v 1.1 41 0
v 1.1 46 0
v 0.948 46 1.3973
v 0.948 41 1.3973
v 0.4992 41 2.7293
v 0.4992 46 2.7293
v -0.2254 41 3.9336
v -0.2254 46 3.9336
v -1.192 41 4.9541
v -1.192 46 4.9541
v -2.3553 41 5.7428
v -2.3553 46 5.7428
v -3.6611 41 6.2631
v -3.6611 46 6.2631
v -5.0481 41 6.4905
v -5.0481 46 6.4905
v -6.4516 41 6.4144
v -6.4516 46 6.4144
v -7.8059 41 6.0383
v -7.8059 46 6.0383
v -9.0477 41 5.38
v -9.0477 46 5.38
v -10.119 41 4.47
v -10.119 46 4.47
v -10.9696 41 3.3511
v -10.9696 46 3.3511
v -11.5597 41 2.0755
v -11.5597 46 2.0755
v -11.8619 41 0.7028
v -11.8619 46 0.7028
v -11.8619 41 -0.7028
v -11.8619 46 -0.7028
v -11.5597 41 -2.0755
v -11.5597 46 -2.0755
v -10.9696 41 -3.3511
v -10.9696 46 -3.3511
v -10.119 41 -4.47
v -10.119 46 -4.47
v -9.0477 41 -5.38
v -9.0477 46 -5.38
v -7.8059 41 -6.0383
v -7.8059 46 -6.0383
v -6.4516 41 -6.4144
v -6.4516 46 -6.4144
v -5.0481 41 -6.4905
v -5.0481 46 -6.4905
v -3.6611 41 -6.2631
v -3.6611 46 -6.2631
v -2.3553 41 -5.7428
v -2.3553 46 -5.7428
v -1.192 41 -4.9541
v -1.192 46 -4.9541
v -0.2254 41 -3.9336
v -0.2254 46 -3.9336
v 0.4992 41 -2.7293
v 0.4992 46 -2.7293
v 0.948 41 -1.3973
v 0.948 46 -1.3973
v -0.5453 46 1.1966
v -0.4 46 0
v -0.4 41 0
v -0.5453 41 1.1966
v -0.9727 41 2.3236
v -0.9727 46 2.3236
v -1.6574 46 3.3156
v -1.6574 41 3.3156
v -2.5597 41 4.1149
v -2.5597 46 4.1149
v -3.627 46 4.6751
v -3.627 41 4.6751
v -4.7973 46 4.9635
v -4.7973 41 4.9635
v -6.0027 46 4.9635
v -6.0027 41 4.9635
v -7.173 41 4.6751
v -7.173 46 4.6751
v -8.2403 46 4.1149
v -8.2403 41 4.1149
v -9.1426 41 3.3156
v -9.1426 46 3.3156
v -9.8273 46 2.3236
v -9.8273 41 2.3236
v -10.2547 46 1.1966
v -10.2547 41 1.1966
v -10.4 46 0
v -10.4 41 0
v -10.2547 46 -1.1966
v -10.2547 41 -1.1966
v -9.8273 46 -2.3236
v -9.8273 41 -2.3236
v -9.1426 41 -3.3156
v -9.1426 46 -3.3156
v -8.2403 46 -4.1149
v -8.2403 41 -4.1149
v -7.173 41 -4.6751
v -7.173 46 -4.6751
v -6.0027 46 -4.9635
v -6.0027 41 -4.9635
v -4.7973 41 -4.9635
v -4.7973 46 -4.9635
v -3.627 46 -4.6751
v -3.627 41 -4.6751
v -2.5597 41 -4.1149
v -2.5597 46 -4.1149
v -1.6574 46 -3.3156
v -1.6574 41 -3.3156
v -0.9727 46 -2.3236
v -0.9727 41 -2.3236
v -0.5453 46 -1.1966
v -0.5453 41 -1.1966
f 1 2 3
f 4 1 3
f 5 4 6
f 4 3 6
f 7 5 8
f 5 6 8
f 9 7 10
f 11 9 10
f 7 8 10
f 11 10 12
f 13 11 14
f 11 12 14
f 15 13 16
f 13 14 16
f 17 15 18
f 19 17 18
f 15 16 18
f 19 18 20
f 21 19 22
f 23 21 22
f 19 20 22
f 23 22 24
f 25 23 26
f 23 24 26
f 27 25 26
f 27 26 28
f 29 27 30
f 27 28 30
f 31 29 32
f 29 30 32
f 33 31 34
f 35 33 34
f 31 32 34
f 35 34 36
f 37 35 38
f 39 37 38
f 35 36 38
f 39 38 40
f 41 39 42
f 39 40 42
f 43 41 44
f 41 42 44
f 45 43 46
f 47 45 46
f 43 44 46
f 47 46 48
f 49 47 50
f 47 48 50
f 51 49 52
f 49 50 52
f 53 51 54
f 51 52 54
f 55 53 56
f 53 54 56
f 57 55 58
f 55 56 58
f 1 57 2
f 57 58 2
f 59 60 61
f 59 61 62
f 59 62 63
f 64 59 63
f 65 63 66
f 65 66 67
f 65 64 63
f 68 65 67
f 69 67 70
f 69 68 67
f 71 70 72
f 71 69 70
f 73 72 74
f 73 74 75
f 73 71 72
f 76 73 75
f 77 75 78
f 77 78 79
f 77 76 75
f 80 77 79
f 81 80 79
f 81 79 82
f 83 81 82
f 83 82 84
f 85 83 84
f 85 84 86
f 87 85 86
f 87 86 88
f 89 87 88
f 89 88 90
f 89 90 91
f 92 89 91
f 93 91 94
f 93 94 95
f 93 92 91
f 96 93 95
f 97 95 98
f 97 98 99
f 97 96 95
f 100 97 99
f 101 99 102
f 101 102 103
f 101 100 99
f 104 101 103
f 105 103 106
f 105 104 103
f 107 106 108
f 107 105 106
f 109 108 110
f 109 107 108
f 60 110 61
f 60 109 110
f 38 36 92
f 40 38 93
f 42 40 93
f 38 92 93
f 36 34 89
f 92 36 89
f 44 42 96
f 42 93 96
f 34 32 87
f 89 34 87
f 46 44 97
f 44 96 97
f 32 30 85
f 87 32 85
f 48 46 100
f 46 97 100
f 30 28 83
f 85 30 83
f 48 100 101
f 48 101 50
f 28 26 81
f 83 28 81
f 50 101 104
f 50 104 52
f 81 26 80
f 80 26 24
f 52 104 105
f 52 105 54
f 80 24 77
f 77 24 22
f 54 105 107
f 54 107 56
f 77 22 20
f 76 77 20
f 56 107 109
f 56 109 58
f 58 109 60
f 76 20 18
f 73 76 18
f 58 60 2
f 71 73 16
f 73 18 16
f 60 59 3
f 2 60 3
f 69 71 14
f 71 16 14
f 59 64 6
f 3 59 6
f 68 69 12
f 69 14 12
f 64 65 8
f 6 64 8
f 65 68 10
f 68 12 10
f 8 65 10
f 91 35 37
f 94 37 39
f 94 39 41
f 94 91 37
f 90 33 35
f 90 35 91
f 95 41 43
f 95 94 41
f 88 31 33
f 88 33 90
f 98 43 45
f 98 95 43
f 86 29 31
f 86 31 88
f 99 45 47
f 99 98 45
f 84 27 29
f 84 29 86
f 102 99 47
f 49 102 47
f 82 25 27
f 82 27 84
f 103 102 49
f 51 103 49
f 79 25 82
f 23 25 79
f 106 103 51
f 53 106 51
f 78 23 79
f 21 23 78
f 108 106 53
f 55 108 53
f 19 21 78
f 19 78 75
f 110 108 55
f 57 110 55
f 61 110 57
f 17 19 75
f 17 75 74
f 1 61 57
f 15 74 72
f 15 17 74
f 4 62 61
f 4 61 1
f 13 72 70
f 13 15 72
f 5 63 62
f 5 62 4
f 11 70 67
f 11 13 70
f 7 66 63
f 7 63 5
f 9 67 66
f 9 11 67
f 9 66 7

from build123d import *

# Parameters (mm, degrees)
CYLINDER005_R          = 5
CYLINDER005_DEPTH      = 5
CYLINDER005_ROLL_ANGLE = 90
CYLINDER006_R          = 6.5
CYLINDER006_DEPTH      = 5
CYLINDER006_ROLL_ANGLE = 90


with BuildPart() as cylinder005:
    # Cylinder005 → Cylinder005 (new body)
    with BuildSketch(Plane.XY):
        Circle(CYLINDER005_R)
    extrude(amount=CYLINDER005_DEPTH)


with BuildPart() as cylinder005_1:
    # Cylinder005 roll: moved
    add(cylinder005.part.rotate(Axis((0, 0, 0), (1, 0, 0)), CYLINDER005_ROLL_ANGLE))


with BuildPart() as cylinder005_2:
    # Cylinder005 placement: moved
    add(cylinder005_1.part.moved(Location((-5.4, 46, 0))))


with BuildPart() as cut001:
    # Cylinder006 → Cylinder006 (new body)
    with BuildSketch(Plane.XY):
        Circle(CYLINDER006_R)
    extrude(amount=CYLINDER006_DEPTH)


with BuildPart() as cut001_1:
    # Cylinder006 roll: moved
    add(cut001.part.rotate(Axis((0, 0, 0), (1, 0, 0)), CYLINDER006_ROLL_ANGLE))


with BuildPart() as cut001_2:
    # Cylinder006 placement: moved
    add(cut001_1.part.moved(Location((-5.4, 46, 0))))

    # Cut001: cut Cylinder005
    add(cylinder005_2.part, mode=Mode.SUBTRACT)


solid = cut001_2.part
